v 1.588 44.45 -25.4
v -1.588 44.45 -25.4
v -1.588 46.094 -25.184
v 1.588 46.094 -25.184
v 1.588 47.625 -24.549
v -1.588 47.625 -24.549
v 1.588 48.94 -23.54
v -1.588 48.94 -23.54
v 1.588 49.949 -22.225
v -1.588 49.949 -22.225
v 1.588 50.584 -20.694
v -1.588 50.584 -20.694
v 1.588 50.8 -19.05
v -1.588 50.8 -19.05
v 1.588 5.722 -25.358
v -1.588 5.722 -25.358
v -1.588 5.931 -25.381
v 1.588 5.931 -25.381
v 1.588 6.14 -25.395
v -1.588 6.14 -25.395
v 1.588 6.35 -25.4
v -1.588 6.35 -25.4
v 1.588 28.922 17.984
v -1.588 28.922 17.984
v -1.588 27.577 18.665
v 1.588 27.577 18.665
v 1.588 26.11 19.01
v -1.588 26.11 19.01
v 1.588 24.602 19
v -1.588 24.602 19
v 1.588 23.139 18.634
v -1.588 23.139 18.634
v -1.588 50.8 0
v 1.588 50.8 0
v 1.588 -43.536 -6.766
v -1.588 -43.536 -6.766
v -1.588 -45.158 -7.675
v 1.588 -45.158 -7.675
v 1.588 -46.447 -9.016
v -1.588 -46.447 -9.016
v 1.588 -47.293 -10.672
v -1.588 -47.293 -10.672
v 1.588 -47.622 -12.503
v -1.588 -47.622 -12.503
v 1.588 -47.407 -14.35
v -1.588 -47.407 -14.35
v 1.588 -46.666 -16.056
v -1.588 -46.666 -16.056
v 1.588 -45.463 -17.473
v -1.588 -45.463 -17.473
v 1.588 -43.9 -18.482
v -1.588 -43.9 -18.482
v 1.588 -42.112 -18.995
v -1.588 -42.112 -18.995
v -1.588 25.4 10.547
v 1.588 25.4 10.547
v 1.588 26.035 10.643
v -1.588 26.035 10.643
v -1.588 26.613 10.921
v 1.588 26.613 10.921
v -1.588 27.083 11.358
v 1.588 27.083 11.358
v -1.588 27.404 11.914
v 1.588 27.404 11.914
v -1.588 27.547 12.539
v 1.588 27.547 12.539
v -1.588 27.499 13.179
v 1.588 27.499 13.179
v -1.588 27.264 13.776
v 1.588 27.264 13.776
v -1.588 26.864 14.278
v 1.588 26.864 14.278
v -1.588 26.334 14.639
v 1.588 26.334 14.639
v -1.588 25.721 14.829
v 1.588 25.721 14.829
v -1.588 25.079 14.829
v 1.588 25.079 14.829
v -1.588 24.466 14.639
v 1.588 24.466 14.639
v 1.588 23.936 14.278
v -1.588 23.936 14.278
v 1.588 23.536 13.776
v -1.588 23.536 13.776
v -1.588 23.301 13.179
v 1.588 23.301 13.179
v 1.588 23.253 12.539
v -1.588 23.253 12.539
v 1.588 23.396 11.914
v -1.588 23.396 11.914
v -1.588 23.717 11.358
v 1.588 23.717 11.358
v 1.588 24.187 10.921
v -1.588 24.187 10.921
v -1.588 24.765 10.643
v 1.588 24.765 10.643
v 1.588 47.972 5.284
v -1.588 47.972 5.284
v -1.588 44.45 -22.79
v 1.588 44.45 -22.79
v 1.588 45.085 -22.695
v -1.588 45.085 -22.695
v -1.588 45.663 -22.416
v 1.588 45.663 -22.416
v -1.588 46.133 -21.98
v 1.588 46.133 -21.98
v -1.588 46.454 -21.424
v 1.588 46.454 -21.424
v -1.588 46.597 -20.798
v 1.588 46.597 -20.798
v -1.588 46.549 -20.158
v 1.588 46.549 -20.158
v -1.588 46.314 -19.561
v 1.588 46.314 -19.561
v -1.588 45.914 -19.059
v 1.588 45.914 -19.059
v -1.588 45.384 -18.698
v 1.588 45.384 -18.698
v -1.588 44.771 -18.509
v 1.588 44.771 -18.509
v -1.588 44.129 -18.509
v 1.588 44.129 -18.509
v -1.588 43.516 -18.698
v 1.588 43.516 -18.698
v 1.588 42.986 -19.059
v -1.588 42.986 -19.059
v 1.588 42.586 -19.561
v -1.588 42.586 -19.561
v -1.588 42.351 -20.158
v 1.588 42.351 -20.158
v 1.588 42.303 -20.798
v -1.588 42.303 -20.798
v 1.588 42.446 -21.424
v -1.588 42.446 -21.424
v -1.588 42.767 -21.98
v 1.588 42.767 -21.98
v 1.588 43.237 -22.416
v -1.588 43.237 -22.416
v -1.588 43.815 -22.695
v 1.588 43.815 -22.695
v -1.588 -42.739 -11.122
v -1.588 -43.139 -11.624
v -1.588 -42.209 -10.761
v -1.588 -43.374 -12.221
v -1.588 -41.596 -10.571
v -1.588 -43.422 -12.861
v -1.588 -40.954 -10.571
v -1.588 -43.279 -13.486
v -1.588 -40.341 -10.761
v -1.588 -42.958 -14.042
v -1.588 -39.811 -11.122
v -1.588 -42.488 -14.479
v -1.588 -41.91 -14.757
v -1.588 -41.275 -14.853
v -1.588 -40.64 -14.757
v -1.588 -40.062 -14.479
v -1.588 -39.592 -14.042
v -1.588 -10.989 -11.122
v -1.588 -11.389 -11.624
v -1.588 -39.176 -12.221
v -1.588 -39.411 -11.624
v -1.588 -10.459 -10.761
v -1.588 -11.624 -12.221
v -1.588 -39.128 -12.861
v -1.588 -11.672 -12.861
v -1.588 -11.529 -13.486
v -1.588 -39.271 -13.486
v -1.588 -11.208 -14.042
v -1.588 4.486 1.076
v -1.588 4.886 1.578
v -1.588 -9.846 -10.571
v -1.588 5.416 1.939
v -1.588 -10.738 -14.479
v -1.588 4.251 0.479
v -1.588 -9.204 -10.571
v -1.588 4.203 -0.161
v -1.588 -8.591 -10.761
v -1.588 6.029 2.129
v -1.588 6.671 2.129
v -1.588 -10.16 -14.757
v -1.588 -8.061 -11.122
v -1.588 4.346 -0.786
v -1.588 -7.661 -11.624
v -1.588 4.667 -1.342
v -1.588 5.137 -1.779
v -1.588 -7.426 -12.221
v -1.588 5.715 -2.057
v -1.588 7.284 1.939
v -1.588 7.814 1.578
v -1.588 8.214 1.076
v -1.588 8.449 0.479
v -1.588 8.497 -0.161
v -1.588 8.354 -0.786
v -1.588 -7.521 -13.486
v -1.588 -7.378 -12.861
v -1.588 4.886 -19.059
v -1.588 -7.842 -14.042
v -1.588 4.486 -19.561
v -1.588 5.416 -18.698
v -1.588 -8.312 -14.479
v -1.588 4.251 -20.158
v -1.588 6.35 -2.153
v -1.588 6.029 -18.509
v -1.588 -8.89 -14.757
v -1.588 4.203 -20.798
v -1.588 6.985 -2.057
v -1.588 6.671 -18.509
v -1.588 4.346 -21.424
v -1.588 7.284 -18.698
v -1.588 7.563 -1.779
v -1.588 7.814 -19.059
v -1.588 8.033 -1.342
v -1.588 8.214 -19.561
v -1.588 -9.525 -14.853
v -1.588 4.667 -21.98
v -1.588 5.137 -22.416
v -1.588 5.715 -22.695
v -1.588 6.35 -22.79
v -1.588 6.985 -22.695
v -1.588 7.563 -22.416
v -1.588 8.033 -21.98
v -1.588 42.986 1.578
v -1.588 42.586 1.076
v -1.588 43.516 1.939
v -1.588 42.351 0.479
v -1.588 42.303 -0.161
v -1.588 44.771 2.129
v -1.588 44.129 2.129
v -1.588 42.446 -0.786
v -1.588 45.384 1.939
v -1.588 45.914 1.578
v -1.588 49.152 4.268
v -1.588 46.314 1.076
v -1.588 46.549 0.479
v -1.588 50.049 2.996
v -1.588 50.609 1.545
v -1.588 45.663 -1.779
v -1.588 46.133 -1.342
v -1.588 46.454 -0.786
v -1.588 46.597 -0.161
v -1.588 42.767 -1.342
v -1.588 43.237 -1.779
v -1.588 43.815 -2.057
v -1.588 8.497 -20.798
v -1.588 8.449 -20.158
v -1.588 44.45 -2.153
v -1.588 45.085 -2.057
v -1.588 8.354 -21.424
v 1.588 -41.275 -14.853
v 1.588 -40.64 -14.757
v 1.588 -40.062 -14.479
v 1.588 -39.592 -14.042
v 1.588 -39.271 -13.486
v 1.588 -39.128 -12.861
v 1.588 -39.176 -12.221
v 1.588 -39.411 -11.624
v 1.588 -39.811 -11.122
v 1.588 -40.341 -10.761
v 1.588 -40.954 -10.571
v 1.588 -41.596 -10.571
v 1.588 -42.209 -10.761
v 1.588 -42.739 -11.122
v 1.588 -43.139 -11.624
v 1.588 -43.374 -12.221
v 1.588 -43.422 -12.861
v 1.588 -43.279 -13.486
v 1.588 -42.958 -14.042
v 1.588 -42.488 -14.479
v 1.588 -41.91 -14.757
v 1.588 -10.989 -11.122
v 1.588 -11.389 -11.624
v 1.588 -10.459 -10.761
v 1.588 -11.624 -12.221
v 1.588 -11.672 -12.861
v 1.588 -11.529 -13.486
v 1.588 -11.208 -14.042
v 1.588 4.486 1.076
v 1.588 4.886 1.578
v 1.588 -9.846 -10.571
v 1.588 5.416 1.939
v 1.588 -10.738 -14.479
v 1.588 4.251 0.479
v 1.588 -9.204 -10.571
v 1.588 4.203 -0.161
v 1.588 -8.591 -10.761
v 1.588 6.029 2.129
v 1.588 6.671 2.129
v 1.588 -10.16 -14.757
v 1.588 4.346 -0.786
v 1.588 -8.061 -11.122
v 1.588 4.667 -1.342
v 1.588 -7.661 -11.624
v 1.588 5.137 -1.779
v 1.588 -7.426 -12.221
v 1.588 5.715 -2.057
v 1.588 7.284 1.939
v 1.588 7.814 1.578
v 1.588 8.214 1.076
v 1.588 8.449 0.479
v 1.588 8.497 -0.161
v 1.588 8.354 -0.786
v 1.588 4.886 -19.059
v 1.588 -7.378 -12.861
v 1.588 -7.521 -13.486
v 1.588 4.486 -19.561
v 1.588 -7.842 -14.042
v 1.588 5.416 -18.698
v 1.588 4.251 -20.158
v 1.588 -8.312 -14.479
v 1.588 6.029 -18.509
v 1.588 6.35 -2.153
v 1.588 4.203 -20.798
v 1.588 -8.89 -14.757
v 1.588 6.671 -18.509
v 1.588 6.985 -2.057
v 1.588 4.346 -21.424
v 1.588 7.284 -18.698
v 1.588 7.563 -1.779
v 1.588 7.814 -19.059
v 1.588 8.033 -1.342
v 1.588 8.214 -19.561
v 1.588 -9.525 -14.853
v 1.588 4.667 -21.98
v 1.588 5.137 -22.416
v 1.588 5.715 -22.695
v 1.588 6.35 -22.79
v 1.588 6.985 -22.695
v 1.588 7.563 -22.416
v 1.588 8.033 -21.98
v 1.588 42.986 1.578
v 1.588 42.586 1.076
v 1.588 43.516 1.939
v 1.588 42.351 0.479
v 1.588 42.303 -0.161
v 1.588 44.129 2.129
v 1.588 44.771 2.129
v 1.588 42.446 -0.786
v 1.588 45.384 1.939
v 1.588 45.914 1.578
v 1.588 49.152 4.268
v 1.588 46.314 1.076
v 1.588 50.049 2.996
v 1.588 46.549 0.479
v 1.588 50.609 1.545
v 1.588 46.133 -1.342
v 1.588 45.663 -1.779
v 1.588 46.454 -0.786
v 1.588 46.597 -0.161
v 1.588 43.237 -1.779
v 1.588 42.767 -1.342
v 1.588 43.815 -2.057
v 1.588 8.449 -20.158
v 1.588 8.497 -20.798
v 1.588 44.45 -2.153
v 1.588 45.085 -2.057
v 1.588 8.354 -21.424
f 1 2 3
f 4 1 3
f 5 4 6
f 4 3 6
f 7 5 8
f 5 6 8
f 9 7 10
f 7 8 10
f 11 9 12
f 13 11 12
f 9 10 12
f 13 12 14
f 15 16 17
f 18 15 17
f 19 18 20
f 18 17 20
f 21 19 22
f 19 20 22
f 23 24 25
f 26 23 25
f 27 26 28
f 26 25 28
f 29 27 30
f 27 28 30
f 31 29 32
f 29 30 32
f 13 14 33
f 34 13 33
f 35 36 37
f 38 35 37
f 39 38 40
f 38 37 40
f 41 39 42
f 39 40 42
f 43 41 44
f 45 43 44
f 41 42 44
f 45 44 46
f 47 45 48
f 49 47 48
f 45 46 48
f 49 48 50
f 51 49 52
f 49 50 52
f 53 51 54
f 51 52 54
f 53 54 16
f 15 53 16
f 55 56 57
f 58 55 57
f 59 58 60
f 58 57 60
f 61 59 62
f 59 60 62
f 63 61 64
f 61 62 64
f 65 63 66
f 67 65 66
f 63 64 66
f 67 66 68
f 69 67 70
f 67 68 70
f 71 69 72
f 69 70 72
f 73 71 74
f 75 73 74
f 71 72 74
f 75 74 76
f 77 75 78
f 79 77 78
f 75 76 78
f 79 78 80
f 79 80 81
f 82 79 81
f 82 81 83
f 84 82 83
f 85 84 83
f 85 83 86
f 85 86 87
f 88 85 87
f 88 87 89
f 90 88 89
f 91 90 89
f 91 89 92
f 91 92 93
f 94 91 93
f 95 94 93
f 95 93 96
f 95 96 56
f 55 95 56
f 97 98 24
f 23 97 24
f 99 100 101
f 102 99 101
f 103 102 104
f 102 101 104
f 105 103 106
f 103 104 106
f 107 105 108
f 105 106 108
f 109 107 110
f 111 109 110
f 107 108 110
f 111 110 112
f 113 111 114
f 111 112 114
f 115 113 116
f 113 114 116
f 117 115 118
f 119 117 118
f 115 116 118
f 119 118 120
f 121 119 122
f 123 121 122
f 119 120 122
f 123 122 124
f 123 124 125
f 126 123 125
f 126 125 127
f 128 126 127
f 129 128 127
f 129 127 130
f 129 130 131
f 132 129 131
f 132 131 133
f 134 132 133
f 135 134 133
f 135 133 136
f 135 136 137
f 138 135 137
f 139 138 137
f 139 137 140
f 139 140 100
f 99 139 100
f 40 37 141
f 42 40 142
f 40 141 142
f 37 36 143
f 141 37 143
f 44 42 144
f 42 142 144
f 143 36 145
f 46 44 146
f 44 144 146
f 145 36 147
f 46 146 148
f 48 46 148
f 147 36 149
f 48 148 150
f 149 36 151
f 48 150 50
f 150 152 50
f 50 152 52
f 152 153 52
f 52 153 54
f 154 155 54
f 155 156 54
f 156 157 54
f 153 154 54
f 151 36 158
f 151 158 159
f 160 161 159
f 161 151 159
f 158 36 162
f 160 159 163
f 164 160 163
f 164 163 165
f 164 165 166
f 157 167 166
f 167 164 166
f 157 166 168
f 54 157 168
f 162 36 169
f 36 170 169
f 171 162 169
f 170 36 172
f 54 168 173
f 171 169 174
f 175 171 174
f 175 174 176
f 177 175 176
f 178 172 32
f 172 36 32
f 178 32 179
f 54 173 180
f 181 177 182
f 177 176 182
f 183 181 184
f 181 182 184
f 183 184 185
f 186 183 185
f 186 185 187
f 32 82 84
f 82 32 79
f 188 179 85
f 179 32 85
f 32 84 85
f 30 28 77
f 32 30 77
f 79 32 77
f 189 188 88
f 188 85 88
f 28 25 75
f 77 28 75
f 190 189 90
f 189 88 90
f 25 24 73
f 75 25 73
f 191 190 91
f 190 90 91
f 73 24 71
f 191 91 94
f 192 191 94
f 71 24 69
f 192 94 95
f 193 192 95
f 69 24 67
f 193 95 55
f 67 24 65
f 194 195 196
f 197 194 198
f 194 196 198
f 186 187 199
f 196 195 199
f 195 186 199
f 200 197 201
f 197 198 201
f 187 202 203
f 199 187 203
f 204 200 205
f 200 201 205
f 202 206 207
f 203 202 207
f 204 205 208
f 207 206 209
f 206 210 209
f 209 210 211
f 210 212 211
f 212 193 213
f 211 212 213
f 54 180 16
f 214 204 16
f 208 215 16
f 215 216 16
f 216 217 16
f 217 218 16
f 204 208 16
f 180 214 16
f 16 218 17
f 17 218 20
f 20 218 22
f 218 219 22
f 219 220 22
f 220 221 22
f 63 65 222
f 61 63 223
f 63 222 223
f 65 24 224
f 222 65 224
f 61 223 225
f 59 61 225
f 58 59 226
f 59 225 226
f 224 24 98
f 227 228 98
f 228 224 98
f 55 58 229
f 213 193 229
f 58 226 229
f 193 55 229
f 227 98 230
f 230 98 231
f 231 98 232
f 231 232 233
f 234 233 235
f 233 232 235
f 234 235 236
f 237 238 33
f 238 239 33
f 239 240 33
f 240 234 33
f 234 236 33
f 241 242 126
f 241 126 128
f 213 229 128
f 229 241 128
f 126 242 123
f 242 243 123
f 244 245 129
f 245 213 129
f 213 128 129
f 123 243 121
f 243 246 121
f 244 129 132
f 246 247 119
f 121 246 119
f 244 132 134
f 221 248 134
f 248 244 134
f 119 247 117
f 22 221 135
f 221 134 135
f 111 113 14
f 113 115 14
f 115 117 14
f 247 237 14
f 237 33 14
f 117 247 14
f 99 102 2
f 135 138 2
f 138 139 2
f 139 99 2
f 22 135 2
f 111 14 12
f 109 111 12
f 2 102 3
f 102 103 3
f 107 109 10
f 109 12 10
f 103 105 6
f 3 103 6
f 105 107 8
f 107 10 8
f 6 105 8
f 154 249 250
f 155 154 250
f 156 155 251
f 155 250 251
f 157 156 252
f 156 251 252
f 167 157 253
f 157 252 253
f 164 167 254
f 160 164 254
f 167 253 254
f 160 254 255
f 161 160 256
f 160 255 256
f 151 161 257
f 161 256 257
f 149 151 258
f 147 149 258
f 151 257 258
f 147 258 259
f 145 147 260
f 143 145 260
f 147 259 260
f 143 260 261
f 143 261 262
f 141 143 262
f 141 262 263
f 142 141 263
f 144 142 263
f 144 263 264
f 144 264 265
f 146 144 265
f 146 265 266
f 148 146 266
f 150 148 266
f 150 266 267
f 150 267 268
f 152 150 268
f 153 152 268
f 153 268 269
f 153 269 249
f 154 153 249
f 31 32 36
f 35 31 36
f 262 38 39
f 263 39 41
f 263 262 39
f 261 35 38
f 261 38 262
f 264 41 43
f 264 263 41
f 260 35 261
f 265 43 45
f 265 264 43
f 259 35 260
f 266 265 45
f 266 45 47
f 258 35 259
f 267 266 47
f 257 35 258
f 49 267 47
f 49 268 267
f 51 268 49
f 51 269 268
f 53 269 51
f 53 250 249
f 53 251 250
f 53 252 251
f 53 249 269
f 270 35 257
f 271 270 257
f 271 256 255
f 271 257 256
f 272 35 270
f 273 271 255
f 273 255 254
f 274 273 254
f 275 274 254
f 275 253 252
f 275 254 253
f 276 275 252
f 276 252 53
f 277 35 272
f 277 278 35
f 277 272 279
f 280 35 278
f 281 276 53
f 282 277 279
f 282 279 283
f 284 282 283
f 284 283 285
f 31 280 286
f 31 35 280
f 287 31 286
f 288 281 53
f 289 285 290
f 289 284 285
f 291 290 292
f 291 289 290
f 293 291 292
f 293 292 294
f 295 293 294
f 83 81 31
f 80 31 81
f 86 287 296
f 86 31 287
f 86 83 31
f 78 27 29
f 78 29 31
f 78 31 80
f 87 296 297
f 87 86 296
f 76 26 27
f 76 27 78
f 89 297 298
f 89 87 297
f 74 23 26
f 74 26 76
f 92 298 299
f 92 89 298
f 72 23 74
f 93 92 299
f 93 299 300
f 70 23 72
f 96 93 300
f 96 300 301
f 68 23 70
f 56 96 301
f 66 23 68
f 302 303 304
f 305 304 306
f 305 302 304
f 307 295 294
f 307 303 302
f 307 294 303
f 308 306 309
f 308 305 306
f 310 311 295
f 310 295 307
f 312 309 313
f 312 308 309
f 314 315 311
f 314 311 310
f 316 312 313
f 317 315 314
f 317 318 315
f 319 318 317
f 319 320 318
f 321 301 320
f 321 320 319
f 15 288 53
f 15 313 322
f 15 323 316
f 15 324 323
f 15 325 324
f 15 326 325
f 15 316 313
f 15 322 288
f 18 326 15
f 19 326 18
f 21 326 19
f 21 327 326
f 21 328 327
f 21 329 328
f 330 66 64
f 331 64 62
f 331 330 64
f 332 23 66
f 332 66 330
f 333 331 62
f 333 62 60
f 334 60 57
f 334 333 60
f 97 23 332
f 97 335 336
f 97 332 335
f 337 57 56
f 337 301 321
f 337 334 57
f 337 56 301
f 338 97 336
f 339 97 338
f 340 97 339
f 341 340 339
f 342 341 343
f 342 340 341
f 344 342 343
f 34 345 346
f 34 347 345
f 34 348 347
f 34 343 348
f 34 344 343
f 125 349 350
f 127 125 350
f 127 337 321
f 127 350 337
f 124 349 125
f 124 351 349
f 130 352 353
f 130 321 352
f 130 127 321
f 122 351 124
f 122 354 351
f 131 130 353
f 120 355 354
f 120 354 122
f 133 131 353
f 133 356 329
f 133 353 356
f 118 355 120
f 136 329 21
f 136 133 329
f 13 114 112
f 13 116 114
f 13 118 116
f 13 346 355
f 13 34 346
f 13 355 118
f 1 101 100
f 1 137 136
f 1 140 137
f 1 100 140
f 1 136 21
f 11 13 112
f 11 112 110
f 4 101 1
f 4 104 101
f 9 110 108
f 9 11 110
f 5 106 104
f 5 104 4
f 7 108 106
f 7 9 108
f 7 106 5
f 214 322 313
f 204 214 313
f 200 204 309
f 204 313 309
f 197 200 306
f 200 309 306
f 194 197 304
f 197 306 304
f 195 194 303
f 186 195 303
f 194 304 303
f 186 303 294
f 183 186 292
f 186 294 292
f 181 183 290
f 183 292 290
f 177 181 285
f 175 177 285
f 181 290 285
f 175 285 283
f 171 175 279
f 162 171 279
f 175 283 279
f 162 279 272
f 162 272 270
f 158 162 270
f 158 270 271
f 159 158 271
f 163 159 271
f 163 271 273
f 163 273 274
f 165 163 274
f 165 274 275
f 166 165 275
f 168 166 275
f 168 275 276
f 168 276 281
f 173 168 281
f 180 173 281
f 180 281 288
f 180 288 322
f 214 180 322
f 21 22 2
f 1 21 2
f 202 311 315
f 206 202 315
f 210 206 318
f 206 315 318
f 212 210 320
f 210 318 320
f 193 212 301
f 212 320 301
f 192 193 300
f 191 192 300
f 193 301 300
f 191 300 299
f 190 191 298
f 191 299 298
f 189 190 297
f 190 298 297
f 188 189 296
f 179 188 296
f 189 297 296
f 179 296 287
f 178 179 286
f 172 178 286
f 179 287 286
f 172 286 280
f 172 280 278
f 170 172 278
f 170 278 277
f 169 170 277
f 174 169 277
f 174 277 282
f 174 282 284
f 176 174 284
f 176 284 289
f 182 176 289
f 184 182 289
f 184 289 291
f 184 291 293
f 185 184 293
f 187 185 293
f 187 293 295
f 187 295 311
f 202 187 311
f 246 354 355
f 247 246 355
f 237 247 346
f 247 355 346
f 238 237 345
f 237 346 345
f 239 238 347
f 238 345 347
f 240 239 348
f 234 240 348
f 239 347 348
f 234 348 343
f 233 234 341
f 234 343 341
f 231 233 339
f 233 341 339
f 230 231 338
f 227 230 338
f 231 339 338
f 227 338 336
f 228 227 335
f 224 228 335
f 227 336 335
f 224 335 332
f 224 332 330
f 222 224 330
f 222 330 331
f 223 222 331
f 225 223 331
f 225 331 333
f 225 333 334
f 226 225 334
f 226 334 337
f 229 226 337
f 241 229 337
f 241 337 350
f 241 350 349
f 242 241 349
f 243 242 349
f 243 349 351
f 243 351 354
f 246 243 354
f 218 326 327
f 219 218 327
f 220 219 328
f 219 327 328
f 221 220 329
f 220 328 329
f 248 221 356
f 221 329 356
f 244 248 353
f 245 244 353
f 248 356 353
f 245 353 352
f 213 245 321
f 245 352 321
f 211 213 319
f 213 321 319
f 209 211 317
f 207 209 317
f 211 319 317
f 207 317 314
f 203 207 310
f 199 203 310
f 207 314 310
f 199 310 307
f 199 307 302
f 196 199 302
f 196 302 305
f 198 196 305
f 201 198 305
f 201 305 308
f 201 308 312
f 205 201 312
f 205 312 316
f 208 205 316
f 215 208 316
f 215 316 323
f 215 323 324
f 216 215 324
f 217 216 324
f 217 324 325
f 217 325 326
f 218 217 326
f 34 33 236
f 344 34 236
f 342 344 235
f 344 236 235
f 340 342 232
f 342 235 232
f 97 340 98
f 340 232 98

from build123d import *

# Parameters (mm, degrees)
SKETCH1_W             = 50.8
SKETCH1_H             = 101.6
BOSS_EXTRUDE1_DEPTH   = 1.5875
F_8_CLEARANCE_HOLE1_D = 4.3053
SKETCH4_W             = 64.445768018
SKETCH4_H             = 114.740745706
CUT_EXTRUDE1_DEPTH    = 3.175


with BuildPart() as part:
    # Sketch1 → Boss-Extrude1 (new, symmetric)
    with BuildSketch(Plane(origin=(0, 0, 0), x_dir=(0, 0, -1), z_dir=(1, 0, 0))):
        Rectangle(SKETCH1_W, SKETCH1_H)
    extrude(amount=BOSS_EXTRUDE1_DEPTH, both=True)

    # #8 Clearance Hole1 (through all)
    with Locations(Plane.ZY.offset(1.5875)):
        with Locations((-12.7, -41.275), (-12.7, -9.525), (-20.6375, 6.35), (0, 6.35), (12.7, 25.4), (0, 44.45), (-20.6375, 44.45)):
            Hole(F_8_CLEARANCE_HOLE1_D / 2)

    # Sketch4 → Cut-Extrude1 (cut)
    with BuildSketch(Plane.ZY.offset(1.5875)):
        Rectangle(SKETCH4_W, SKETCH4_H)
        with BuildLine():
            Line((-19.05, 50.8), (0, 50.8))
            ThreePointArc((0, 50.8), (2.996297827, 50.048633702), (5.283519369, 47.972346246))
            Line((5.283519369, 47.972346246), (17.983519369, 28.922346246))
            ThreePointArc((17.983519369, 28.922346246), (19.010206024, 26.109788659), (18.633997117, 23.13942967))
            Line((18.633997117, 23.13942967), (-6.766002883, -43.53557033))
            ThreePointArc((-6.766002883, -43.53557033), (-13.434053527, -47.582429383), (-18.994539095, -42.112423182))
            Line((-18.994539095, -42.112423182), (-25.358404321, 5.721932613))
            ThreePointArc((-25.358404321, 5.721932613), (-25.389589702, 6.03527836), (-25.4, 6.35))
            Line((-25.4, 6.35), (-25.4, 44.45))
            ThreePointArc((-25.4, 44.45), (-23.540128061, 48.940128061), (-19.05, 50.8))
        make_face(mode=Mode.SUBTRACT)
    extrude(amount=-CUT_EXTRUDE1_DEPTH, mode=Mode.SUBTRACT)


solid = part.part
